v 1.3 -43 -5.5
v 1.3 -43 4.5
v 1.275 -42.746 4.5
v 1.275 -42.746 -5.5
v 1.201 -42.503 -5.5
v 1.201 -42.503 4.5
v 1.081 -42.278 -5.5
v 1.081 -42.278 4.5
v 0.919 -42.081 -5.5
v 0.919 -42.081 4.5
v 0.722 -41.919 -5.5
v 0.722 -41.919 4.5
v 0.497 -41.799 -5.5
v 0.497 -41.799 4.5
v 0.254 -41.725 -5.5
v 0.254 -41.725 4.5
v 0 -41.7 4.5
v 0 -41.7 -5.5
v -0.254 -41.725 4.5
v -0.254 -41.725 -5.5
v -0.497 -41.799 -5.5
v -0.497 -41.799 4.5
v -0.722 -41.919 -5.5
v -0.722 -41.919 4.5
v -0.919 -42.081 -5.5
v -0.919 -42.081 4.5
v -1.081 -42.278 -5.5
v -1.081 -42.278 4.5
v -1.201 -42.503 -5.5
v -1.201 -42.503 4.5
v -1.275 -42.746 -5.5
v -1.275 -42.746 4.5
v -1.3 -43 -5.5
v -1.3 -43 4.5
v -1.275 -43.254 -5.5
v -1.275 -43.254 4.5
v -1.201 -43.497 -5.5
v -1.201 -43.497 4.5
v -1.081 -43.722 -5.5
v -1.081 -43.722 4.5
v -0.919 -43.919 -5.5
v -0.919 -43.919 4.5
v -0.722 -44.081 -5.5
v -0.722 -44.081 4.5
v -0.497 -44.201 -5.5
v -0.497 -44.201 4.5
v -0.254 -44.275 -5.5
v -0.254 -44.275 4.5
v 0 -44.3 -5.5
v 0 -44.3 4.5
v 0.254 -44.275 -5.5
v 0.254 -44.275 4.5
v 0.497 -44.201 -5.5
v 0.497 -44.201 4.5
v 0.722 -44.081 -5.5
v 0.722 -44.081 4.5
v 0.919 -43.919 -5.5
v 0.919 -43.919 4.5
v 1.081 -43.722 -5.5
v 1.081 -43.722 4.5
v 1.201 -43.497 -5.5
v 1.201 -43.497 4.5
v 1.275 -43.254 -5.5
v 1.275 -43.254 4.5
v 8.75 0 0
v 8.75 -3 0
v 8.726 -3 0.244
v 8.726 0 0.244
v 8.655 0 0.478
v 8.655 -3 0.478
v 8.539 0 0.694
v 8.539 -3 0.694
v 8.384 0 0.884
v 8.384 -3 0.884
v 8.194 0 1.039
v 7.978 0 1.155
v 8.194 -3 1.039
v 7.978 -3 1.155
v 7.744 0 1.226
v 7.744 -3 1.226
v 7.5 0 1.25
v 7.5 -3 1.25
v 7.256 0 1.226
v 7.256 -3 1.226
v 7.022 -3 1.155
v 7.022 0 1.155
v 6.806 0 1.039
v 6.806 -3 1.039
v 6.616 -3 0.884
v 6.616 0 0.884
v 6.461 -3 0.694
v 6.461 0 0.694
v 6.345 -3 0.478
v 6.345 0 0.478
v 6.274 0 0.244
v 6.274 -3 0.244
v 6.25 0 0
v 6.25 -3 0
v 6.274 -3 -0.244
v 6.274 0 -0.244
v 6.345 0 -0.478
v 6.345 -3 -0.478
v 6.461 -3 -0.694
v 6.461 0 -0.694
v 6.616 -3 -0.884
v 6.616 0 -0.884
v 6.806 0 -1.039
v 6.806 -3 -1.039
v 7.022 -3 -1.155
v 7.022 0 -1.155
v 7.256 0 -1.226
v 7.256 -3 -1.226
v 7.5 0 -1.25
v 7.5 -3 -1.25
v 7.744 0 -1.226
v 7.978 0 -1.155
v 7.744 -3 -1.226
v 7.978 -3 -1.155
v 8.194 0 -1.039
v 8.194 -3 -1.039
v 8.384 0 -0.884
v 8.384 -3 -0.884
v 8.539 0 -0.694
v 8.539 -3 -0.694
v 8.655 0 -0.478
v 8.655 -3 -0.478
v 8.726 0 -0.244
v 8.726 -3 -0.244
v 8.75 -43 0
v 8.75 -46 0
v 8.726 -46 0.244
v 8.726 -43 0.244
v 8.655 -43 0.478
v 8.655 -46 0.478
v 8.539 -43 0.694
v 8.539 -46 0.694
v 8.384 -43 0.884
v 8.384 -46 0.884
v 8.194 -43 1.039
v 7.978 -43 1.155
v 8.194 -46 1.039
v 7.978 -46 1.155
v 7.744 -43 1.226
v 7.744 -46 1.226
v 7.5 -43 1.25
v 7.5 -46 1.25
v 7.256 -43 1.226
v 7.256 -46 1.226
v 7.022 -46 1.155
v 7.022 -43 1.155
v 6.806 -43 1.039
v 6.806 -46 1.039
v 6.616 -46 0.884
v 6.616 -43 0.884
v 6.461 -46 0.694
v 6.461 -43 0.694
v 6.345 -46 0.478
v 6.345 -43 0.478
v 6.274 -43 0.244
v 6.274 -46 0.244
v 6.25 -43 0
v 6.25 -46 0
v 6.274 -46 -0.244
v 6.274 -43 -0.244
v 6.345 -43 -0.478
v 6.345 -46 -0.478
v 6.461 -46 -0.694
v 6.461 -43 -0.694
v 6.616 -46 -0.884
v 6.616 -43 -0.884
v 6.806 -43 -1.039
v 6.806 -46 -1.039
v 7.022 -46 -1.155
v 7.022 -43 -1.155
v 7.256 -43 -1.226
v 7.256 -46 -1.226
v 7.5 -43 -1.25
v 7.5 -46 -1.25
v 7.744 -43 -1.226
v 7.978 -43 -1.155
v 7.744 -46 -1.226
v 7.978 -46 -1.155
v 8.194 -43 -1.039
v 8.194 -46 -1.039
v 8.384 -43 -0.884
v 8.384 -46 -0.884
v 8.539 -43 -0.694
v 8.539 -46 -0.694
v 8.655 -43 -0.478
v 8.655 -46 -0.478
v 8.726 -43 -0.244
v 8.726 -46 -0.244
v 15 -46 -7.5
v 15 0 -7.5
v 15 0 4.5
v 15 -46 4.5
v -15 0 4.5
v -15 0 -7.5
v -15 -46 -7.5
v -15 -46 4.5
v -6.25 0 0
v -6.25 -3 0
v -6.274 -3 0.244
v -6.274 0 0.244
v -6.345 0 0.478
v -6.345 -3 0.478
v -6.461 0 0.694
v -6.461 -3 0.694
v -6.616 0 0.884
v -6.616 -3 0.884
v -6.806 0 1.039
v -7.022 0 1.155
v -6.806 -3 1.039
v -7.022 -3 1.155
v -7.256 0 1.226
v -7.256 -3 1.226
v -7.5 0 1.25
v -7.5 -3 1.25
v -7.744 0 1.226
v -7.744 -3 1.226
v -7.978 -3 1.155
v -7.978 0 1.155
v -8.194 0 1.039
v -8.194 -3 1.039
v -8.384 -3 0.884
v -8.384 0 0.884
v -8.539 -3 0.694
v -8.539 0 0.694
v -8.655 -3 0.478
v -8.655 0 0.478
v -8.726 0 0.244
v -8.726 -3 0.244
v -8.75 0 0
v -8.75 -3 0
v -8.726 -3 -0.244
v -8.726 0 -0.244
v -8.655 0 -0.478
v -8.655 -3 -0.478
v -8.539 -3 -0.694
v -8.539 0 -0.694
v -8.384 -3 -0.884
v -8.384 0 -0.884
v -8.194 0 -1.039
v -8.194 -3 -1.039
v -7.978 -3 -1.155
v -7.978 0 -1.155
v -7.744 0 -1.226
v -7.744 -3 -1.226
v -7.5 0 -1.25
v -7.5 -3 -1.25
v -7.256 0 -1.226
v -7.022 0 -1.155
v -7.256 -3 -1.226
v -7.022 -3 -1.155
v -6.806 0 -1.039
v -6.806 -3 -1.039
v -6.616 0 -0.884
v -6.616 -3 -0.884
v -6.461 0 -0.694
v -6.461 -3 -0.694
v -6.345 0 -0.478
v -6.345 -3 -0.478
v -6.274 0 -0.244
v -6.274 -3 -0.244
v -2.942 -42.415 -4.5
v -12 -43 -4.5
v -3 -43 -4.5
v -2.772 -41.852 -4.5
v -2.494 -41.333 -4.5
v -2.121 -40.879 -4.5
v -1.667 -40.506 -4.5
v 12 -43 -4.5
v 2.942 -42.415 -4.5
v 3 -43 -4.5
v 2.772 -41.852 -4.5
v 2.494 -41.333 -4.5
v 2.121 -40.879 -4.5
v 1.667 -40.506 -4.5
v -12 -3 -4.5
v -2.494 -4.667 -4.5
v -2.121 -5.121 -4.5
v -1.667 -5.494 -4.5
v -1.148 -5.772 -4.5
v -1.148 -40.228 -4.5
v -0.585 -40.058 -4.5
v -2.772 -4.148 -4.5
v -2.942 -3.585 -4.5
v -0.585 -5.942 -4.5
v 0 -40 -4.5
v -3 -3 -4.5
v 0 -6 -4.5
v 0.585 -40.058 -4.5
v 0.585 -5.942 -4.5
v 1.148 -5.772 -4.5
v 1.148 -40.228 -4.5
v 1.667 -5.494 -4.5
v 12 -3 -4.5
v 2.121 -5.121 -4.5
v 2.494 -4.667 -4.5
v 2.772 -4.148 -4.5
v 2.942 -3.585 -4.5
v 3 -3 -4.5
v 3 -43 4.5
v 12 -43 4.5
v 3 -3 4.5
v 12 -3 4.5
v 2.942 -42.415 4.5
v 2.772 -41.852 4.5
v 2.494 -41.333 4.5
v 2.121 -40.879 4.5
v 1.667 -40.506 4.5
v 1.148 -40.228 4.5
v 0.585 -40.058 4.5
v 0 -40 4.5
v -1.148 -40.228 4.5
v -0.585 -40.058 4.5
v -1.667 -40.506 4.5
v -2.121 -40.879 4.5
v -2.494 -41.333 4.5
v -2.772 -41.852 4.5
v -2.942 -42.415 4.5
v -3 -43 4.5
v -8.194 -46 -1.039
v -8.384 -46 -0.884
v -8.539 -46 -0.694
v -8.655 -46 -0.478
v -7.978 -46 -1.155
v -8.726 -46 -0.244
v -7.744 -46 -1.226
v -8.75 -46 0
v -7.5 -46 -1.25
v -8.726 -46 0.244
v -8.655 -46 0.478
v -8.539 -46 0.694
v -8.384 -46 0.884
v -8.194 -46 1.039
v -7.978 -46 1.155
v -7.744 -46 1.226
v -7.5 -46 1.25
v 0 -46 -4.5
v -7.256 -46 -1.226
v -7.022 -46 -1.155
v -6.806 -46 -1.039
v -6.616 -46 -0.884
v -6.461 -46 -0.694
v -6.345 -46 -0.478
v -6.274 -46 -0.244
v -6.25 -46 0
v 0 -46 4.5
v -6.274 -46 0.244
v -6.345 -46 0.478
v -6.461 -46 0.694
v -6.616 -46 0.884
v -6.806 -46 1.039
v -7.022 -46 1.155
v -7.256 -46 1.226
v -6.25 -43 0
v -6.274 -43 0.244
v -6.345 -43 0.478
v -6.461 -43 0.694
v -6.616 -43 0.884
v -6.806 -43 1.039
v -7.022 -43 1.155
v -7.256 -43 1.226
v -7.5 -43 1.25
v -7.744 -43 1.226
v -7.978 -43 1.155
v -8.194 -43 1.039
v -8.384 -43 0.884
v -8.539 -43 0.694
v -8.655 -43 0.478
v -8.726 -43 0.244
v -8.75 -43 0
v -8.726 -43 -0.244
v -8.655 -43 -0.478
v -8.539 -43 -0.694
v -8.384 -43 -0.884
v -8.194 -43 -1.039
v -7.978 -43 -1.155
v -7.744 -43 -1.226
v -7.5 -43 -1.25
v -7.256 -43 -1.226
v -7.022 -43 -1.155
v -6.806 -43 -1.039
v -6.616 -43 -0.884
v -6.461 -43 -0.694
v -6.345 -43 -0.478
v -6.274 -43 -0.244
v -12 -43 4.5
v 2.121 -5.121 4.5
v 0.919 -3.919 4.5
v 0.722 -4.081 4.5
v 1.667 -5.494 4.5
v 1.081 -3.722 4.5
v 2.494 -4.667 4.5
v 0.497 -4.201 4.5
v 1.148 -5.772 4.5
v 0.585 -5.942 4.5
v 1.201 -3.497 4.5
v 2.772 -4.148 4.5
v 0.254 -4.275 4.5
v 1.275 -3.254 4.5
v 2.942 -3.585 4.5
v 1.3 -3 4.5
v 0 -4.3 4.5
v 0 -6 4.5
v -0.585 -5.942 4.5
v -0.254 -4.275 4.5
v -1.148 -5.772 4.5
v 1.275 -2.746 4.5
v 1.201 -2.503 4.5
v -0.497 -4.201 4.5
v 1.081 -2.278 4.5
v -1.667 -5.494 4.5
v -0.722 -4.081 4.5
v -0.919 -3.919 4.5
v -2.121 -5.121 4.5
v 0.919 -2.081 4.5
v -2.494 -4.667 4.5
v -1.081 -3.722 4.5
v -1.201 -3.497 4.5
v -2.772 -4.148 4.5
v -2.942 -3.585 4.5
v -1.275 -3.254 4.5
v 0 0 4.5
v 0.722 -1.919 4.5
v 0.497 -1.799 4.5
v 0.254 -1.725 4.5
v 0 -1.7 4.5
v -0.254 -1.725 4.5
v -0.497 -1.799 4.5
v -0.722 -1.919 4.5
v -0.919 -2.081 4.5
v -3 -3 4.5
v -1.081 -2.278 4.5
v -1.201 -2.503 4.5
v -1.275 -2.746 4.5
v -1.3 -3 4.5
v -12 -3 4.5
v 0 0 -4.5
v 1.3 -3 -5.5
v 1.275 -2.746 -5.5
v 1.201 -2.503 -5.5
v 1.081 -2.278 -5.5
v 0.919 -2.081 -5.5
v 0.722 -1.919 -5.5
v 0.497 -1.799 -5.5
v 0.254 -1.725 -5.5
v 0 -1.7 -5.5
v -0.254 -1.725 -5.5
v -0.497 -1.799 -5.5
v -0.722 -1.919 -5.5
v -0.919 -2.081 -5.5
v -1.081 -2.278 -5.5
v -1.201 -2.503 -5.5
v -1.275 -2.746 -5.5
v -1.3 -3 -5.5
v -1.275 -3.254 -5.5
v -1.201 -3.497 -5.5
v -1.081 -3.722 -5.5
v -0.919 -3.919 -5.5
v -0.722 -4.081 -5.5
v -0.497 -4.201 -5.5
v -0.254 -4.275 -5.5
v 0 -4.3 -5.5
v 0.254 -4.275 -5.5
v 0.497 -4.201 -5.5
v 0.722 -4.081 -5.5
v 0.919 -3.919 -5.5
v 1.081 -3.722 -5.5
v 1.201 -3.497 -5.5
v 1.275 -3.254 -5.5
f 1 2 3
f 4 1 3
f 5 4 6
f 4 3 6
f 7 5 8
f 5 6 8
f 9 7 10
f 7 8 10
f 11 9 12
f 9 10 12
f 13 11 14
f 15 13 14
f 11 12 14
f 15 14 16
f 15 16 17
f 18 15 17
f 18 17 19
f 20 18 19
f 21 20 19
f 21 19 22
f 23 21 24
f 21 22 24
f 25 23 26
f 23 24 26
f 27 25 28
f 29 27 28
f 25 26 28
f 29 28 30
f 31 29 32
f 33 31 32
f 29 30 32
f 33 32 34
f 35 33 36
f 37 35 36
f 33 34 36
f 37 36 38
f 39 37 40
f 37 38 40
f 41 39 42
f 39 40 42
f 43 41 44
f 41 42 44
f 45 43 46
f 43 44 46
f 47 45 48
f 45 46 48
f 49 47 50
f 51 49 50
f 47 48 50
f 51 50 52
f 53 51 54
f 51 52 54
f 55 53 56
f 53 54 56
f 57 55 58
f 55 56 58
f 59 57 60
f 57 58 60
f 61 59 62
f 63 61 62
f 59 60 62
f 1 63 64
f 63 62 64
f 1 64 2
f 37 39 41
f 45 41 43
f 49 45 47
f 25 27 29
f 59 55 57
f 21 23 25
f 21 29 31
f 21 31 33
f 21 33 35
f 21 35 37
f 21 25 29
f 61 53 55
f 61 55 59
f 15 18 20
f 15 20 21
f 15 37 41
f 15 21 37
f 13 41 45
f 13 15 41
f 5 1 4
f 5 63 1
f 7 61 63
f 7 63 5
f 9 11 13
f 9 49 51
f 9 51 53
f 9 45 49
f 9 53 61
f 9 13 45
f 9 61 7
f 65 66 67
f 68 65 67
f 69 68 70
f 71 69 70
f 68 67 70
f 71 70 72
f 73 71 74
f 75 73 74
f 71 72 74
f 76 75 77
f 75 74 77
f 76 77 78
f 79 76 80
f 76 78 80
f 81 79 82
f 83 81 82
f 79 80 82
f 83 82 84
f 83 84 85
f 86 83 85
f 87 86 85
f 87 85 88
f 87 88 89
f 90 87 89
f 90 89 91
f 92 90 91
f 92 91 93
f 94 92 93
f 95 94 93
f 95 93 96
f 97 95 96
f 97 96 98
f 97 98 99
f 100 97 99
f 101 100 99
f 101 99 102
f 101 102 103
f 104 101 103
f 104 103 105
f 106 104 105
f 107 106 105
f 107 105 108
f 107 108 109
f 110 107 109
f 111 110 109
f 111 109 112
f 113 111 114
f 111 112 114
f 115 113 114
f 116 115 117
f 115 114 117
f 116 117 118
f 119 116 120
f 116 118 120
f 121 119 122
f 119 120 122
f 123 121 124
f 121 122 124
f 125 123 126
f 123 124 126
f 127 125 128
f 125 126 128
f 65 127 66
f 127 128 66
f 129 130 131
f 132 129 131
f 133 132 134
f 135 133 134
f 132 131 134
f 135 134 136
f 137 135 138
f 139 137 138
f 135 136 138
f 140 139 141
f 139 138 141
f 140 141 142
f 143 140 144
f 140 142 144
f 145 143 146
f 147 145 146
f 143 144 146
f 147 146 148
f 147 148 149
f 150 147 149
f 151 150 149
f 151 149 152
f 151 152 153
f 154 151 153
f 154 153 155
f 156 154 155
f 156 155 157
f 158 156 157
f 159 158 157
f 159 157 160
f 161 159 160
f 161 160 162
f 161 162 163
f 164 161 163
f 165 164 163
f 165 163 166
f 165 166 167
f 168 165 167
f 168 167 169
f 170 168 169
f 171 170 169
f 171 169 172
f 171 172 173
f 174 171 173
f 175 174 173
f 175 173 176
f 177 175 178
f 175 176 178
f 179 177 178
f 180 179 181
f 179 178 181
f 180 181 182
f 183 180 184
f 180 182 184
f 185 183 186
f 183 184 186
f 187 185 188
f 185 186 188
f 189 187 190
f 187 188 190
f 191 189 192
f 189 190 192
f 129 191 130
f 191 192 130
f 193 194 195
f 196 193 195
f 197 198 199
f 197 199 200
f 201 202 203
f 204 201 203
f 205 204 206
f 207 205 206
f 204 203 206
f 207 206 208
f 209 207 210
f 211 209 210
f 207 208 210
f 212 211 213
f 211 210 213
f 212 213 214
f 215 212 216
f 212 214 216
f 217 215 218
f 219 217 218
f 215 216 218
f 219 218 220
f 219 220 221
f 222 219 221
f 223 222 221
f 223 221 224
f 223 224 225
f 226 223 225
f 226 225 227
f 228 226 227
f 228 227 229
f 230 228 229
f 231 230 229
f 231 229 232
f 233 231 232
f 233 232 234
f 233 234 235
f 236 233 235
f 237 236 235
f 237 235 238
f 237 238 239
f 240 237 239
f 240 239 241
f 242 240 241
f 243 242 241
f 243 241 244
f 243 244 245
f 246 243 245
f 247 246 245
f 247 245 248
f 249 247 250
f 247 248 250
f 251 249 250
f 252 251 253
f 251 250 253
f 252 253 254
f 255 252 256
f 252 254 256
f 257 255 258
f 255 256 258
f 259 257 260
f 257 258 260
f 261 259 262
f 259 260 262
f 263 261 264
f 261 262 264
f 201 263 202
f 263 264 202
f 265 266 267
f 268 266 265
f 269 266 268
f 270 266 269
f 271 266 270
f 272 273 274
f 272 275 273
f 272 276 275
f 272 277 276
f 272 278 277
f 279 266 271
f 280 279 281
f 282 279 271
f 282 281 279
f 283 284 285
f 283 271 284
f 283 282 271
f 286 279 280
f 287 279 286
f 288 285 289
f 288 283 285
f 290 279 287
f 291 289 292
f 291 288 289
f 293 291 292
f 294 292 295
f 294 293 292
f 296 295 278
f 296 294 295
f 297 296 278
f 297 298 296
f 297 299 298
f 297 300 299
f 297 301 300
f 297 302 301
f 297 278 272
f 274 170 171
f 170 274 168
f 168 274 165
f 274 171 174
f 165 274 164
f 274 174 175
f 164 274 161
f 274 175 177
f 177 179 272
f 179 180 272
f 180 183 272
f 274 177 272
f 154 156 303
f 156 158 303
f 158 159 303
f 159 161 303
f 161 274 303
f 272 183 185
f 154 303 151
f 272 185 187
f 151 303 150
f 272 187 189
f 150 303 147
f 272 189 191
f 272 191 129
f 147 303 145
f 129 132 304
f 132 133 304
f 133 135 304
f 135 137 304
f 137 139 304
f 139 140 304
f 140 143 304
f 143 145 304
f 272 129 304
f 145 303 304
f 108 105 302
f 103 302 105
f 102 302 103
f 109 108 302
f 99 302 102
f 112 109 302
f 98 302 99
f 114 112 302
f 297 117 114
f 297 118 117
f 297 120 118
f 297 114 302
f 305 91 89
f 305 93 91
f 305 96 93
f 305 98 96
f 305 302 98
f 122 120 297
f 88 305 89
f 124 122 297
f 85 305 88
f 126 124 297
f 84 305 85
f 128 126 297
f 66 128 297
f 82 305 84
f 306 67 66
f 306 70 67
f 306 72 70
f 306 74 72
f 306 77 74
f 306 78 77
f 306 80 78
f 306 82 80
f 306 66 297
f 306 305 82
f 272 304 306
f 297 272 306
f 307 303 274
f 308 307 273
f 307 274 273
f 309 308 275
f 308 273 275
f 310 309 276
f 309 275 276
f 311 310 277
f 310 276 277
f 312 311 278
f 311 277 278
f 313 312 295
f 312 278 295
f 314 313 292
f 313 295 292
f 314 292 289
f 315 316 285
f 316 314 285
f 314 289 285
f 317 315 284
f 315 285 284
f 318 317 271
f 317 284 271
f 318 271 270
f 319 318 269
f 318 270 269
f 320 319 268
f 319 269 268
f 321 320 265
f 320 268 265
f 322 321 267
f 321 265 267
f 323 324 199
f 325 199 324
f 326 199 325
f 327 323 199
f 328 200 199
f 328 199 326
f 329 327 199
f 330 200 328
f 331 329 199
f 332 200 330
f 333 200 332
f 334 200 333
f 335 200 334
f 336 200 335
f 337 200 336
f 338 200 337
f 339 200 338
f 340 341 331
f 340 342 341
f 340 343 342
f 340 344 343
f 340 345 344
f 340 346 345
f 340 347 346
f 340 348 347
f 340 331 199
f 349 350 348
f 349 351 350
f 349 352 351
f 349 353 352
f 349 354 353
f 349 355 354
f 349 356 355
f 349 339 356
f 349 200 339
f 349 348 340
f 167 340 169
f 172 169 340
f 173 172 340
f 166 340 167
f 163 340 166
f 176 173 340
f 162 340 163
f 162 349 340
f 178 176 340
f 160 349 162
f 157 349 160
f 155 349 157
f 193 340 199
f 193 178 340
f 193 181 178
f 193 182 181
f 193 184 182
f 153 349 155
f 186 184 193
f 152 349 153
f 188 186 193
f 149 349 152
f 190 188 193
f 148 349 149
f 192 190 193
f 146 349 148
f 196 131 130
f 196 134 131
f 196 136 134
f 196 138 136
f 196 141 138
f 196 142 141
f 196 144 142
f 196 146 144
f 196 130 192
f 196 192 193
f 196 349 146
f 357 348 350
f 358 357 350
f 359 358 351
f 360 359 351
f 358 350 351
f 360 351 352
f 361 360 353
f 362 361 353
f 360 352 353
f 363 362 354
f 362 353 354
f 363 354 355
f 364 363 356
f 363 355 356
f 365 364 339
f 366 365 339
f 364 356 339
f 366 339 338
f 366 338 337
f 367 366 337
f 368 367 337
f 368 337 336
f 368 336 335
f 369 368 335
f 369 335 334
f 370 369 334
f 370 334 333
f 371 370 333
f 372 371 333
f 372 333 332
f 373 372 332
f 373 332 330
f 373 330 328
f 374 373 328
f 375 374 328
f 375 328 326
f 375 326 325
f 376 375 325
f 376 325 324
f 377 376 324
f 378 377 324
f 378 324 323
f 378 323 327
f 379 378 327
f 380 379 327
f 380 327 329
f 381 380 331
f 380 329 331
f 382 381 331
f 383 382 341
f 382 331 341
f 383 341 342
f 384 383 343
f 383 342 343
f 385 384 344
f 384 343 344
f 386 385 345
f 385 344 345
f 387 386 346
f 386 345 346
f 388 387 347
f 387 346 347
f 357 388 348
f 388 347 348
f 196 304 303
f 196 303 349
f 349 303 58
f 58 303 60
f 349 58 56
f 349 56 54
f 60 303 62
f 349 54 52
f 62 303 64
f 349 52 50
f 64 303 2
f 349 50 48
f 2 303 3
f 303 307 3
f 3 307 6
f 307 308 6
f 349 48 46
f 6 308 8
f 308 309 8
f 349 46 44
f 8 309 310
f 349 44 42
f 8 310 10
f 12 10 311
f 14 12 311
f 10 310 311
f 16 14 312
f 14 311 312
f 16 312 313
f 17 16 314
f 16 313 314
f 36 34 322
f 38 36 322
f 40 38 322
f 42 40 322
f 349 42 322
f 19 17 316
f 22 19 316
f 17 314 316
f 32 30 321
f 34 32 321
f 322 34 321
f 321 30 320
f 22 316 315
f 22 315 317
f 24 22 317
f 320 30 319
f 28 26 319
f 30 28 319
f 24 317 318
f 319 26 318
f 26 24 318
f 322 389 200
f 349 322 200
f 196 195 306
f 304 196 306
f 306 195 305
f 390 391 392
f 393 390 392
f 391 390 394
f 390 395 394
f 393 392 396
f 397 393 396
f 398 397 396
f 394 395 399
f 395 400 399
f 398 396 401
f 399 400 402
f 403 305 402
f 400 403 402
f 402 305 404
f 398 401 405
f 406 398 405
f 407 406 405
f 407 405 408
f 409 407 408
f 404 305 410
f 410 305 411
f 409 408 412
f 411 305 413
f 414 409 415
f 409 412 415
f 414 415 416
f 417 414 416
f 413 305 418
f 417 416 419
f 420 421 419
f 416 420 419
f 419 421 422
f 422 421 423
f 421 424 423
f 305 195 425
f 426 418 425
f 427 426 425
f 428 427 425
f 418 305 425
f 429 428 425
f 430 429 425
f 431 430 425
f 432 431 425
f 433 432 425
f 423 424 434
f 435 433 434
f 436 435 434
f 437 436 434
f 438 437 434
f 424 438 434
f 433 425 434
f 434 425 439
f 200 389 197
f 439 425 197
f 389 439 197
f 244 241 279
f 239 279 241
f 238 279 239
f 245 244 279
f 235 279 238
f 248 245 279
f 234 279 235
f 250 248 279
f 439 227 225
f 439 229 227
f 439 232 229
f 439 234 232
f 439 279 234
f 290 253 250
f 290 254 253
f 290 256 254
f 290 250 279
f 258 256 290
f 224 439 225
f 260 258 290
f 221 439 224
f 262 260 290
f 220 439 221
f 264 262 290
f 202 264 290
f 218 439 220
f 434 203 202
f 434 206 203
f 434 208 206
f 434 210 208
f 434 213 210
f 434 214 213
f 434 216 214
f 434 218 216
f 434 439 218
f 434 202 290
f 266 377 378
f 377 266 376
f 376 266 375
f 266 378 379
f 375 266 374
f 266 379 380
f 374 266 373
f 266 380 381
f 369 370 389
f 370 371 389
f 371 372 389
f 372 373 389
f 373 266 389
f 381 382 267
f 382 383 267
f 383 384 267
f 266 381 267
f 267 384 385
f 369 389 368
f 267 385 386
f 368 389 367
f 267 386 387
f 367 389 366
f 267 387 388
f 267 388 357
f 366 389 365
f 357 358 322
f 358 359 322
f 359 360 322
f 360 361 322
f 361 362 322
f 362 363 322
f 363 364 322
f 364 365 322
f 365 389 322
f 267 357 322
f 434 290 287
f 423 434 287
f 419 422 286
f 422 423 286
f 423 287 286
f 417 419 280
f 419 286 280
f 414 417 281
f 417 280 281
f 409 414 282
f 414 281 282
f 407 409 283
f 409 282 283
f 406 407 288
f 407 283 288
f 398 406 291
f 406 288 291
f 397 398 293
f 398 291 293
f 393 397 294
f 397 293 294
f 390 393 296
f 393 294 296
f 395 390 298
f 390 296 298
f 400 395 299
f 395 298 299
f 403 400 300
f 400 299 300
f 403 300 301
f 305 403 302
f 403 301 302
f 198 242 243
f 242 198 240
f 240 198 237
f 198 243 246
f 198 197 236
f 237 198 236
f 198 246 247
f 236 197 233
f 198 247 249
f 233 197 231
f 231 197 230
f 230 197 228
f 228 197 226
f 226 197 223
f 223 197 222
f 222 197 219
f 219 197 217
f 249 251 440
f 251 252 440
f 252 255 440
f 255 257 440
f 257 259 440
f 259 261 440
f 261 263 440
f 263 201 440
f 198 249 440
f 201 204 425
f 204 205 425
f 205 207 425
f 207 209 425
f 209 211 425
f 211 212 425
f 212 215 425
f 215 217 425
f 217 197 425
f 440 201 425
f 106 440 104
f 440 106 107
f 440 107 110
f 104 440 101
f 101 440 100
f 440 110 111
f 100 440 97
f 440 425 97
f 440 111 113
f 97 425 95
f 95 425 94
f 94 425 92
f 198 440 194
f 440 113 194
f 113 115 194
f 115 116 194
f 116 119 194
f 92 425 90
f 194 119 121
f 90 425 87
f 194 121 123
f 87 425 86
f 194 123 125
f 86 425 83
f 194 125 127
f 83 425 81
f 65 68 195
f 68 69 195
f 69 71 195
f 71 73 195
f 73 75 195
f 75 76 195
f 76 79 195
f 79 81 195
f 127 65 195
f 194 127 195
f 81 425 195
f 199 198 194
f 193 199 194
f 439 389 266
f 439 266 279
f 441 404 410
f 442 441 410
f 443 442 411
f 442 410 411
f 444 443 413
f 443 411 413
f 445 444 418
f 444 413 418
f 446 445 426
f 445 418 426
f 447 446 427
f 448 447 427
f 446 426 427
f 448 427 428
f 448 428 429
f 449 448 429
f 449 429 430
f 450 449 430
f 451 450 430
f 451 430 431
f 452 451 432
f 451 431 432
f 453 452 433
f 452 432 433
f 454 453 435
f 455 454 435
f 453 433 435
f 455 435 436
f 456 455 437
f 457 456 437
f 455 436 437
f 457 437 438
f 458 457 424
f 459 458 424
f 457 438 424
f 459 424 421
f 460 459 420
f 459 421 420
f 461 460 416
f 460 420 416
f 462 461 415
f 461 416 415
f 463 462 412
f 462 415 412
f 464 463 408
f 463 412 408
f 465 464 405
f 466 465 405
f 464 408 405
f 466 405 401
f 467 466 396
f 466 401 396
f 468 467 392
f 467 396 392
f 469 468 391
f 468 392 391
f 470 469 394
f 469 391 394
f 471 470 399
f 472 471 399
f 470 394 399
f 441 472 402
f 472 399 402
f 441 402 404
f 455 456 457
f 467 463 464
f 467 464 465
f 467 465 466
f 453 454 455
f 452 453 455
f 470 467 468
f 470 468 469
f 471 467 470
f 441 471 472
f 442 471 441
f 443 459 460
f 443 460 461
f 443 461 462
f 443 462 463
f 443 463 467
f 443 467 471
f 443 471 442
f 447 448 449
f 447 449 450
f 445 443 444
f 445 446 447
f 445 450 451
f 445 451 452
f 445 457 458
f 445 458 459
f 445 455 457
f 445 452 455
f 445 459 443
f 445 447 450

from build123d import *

# Parameters (mm, degrees)
F0_W      = 30
F0_H      = 15
F1_DEPTH  = 46
F2_R      = 1.25
F3_DEPTH  = 46
F4_W      = 24
F4_H      = 40
F5_DEPTH  = 12
F6_R      = 3
F7_DEPTH  = 12
F8_W      = 30
F8_H      = 3
F9_DEPTH  = 46.001
F10_R     = 1.3
F11_DEPTH = 10


with BuildPart() as f1:
    # F0 (on Front) → F1 (new body)
    with BuildSketch(Plane.XZ):
        Rectangle(F0_W, F0_H)
    extrude(amount=F1_DEPTH)

    # F2 (on face) → F3 (cut, through all)
    with BuildSketch(Plane.XZ.offset(46)):
        with Locations((-7.5, 0)):
            Circle(F2_R)
        with Locations((7.5, 0)):
            Circle(F2_R)
    extrude(amount=-F3_DEPTH, mode=Mode.SUBTRACT)

    # F4 (on face) → F5 (cut)
    with BuildSketch(Plane.XY.offset(7.5)):
        with Locations((0, -23)):
            Rectangle(F4_W, F4_H)
    extrude(amount=-F5_DEPTH, mode=Mode.SUBTRACT)

    # F6 (on face) → F7 (join)
    with BuildSketch(Plane.XY.offset(-4.5)):
        with Locations((0, -3)):
            Circle(F6_R)
        with Locations((0, -43)):
            Circle(F6_R)
    extrude(amount=F7_DEPTH)

    # F8 (on face) → F9 (cut, through all)
    with BuildSketch(Plane(origin=(0, 0, 0), x_dir=(-1, 0, 0), z_dir=(0, 1, 0))):
        with Locations((0, 6)):
            Rectangle(F8_W, F8_H)
    extrude(amount=-F9_DEPTH, mode=Mode.SUBTRACT)

    # F10 (on face) → F11 (cut)
    with BuildSketch(Plane.XY.offset(4.5)):
        with Locations((0, -3)):
            Circle(F10_R)
        with Locations((0, -43)):
            Circle(F10_R)
    extrude(amount=-F11_DEPTH, mode=Mode.SUBTRACT)


solid = f1.part
